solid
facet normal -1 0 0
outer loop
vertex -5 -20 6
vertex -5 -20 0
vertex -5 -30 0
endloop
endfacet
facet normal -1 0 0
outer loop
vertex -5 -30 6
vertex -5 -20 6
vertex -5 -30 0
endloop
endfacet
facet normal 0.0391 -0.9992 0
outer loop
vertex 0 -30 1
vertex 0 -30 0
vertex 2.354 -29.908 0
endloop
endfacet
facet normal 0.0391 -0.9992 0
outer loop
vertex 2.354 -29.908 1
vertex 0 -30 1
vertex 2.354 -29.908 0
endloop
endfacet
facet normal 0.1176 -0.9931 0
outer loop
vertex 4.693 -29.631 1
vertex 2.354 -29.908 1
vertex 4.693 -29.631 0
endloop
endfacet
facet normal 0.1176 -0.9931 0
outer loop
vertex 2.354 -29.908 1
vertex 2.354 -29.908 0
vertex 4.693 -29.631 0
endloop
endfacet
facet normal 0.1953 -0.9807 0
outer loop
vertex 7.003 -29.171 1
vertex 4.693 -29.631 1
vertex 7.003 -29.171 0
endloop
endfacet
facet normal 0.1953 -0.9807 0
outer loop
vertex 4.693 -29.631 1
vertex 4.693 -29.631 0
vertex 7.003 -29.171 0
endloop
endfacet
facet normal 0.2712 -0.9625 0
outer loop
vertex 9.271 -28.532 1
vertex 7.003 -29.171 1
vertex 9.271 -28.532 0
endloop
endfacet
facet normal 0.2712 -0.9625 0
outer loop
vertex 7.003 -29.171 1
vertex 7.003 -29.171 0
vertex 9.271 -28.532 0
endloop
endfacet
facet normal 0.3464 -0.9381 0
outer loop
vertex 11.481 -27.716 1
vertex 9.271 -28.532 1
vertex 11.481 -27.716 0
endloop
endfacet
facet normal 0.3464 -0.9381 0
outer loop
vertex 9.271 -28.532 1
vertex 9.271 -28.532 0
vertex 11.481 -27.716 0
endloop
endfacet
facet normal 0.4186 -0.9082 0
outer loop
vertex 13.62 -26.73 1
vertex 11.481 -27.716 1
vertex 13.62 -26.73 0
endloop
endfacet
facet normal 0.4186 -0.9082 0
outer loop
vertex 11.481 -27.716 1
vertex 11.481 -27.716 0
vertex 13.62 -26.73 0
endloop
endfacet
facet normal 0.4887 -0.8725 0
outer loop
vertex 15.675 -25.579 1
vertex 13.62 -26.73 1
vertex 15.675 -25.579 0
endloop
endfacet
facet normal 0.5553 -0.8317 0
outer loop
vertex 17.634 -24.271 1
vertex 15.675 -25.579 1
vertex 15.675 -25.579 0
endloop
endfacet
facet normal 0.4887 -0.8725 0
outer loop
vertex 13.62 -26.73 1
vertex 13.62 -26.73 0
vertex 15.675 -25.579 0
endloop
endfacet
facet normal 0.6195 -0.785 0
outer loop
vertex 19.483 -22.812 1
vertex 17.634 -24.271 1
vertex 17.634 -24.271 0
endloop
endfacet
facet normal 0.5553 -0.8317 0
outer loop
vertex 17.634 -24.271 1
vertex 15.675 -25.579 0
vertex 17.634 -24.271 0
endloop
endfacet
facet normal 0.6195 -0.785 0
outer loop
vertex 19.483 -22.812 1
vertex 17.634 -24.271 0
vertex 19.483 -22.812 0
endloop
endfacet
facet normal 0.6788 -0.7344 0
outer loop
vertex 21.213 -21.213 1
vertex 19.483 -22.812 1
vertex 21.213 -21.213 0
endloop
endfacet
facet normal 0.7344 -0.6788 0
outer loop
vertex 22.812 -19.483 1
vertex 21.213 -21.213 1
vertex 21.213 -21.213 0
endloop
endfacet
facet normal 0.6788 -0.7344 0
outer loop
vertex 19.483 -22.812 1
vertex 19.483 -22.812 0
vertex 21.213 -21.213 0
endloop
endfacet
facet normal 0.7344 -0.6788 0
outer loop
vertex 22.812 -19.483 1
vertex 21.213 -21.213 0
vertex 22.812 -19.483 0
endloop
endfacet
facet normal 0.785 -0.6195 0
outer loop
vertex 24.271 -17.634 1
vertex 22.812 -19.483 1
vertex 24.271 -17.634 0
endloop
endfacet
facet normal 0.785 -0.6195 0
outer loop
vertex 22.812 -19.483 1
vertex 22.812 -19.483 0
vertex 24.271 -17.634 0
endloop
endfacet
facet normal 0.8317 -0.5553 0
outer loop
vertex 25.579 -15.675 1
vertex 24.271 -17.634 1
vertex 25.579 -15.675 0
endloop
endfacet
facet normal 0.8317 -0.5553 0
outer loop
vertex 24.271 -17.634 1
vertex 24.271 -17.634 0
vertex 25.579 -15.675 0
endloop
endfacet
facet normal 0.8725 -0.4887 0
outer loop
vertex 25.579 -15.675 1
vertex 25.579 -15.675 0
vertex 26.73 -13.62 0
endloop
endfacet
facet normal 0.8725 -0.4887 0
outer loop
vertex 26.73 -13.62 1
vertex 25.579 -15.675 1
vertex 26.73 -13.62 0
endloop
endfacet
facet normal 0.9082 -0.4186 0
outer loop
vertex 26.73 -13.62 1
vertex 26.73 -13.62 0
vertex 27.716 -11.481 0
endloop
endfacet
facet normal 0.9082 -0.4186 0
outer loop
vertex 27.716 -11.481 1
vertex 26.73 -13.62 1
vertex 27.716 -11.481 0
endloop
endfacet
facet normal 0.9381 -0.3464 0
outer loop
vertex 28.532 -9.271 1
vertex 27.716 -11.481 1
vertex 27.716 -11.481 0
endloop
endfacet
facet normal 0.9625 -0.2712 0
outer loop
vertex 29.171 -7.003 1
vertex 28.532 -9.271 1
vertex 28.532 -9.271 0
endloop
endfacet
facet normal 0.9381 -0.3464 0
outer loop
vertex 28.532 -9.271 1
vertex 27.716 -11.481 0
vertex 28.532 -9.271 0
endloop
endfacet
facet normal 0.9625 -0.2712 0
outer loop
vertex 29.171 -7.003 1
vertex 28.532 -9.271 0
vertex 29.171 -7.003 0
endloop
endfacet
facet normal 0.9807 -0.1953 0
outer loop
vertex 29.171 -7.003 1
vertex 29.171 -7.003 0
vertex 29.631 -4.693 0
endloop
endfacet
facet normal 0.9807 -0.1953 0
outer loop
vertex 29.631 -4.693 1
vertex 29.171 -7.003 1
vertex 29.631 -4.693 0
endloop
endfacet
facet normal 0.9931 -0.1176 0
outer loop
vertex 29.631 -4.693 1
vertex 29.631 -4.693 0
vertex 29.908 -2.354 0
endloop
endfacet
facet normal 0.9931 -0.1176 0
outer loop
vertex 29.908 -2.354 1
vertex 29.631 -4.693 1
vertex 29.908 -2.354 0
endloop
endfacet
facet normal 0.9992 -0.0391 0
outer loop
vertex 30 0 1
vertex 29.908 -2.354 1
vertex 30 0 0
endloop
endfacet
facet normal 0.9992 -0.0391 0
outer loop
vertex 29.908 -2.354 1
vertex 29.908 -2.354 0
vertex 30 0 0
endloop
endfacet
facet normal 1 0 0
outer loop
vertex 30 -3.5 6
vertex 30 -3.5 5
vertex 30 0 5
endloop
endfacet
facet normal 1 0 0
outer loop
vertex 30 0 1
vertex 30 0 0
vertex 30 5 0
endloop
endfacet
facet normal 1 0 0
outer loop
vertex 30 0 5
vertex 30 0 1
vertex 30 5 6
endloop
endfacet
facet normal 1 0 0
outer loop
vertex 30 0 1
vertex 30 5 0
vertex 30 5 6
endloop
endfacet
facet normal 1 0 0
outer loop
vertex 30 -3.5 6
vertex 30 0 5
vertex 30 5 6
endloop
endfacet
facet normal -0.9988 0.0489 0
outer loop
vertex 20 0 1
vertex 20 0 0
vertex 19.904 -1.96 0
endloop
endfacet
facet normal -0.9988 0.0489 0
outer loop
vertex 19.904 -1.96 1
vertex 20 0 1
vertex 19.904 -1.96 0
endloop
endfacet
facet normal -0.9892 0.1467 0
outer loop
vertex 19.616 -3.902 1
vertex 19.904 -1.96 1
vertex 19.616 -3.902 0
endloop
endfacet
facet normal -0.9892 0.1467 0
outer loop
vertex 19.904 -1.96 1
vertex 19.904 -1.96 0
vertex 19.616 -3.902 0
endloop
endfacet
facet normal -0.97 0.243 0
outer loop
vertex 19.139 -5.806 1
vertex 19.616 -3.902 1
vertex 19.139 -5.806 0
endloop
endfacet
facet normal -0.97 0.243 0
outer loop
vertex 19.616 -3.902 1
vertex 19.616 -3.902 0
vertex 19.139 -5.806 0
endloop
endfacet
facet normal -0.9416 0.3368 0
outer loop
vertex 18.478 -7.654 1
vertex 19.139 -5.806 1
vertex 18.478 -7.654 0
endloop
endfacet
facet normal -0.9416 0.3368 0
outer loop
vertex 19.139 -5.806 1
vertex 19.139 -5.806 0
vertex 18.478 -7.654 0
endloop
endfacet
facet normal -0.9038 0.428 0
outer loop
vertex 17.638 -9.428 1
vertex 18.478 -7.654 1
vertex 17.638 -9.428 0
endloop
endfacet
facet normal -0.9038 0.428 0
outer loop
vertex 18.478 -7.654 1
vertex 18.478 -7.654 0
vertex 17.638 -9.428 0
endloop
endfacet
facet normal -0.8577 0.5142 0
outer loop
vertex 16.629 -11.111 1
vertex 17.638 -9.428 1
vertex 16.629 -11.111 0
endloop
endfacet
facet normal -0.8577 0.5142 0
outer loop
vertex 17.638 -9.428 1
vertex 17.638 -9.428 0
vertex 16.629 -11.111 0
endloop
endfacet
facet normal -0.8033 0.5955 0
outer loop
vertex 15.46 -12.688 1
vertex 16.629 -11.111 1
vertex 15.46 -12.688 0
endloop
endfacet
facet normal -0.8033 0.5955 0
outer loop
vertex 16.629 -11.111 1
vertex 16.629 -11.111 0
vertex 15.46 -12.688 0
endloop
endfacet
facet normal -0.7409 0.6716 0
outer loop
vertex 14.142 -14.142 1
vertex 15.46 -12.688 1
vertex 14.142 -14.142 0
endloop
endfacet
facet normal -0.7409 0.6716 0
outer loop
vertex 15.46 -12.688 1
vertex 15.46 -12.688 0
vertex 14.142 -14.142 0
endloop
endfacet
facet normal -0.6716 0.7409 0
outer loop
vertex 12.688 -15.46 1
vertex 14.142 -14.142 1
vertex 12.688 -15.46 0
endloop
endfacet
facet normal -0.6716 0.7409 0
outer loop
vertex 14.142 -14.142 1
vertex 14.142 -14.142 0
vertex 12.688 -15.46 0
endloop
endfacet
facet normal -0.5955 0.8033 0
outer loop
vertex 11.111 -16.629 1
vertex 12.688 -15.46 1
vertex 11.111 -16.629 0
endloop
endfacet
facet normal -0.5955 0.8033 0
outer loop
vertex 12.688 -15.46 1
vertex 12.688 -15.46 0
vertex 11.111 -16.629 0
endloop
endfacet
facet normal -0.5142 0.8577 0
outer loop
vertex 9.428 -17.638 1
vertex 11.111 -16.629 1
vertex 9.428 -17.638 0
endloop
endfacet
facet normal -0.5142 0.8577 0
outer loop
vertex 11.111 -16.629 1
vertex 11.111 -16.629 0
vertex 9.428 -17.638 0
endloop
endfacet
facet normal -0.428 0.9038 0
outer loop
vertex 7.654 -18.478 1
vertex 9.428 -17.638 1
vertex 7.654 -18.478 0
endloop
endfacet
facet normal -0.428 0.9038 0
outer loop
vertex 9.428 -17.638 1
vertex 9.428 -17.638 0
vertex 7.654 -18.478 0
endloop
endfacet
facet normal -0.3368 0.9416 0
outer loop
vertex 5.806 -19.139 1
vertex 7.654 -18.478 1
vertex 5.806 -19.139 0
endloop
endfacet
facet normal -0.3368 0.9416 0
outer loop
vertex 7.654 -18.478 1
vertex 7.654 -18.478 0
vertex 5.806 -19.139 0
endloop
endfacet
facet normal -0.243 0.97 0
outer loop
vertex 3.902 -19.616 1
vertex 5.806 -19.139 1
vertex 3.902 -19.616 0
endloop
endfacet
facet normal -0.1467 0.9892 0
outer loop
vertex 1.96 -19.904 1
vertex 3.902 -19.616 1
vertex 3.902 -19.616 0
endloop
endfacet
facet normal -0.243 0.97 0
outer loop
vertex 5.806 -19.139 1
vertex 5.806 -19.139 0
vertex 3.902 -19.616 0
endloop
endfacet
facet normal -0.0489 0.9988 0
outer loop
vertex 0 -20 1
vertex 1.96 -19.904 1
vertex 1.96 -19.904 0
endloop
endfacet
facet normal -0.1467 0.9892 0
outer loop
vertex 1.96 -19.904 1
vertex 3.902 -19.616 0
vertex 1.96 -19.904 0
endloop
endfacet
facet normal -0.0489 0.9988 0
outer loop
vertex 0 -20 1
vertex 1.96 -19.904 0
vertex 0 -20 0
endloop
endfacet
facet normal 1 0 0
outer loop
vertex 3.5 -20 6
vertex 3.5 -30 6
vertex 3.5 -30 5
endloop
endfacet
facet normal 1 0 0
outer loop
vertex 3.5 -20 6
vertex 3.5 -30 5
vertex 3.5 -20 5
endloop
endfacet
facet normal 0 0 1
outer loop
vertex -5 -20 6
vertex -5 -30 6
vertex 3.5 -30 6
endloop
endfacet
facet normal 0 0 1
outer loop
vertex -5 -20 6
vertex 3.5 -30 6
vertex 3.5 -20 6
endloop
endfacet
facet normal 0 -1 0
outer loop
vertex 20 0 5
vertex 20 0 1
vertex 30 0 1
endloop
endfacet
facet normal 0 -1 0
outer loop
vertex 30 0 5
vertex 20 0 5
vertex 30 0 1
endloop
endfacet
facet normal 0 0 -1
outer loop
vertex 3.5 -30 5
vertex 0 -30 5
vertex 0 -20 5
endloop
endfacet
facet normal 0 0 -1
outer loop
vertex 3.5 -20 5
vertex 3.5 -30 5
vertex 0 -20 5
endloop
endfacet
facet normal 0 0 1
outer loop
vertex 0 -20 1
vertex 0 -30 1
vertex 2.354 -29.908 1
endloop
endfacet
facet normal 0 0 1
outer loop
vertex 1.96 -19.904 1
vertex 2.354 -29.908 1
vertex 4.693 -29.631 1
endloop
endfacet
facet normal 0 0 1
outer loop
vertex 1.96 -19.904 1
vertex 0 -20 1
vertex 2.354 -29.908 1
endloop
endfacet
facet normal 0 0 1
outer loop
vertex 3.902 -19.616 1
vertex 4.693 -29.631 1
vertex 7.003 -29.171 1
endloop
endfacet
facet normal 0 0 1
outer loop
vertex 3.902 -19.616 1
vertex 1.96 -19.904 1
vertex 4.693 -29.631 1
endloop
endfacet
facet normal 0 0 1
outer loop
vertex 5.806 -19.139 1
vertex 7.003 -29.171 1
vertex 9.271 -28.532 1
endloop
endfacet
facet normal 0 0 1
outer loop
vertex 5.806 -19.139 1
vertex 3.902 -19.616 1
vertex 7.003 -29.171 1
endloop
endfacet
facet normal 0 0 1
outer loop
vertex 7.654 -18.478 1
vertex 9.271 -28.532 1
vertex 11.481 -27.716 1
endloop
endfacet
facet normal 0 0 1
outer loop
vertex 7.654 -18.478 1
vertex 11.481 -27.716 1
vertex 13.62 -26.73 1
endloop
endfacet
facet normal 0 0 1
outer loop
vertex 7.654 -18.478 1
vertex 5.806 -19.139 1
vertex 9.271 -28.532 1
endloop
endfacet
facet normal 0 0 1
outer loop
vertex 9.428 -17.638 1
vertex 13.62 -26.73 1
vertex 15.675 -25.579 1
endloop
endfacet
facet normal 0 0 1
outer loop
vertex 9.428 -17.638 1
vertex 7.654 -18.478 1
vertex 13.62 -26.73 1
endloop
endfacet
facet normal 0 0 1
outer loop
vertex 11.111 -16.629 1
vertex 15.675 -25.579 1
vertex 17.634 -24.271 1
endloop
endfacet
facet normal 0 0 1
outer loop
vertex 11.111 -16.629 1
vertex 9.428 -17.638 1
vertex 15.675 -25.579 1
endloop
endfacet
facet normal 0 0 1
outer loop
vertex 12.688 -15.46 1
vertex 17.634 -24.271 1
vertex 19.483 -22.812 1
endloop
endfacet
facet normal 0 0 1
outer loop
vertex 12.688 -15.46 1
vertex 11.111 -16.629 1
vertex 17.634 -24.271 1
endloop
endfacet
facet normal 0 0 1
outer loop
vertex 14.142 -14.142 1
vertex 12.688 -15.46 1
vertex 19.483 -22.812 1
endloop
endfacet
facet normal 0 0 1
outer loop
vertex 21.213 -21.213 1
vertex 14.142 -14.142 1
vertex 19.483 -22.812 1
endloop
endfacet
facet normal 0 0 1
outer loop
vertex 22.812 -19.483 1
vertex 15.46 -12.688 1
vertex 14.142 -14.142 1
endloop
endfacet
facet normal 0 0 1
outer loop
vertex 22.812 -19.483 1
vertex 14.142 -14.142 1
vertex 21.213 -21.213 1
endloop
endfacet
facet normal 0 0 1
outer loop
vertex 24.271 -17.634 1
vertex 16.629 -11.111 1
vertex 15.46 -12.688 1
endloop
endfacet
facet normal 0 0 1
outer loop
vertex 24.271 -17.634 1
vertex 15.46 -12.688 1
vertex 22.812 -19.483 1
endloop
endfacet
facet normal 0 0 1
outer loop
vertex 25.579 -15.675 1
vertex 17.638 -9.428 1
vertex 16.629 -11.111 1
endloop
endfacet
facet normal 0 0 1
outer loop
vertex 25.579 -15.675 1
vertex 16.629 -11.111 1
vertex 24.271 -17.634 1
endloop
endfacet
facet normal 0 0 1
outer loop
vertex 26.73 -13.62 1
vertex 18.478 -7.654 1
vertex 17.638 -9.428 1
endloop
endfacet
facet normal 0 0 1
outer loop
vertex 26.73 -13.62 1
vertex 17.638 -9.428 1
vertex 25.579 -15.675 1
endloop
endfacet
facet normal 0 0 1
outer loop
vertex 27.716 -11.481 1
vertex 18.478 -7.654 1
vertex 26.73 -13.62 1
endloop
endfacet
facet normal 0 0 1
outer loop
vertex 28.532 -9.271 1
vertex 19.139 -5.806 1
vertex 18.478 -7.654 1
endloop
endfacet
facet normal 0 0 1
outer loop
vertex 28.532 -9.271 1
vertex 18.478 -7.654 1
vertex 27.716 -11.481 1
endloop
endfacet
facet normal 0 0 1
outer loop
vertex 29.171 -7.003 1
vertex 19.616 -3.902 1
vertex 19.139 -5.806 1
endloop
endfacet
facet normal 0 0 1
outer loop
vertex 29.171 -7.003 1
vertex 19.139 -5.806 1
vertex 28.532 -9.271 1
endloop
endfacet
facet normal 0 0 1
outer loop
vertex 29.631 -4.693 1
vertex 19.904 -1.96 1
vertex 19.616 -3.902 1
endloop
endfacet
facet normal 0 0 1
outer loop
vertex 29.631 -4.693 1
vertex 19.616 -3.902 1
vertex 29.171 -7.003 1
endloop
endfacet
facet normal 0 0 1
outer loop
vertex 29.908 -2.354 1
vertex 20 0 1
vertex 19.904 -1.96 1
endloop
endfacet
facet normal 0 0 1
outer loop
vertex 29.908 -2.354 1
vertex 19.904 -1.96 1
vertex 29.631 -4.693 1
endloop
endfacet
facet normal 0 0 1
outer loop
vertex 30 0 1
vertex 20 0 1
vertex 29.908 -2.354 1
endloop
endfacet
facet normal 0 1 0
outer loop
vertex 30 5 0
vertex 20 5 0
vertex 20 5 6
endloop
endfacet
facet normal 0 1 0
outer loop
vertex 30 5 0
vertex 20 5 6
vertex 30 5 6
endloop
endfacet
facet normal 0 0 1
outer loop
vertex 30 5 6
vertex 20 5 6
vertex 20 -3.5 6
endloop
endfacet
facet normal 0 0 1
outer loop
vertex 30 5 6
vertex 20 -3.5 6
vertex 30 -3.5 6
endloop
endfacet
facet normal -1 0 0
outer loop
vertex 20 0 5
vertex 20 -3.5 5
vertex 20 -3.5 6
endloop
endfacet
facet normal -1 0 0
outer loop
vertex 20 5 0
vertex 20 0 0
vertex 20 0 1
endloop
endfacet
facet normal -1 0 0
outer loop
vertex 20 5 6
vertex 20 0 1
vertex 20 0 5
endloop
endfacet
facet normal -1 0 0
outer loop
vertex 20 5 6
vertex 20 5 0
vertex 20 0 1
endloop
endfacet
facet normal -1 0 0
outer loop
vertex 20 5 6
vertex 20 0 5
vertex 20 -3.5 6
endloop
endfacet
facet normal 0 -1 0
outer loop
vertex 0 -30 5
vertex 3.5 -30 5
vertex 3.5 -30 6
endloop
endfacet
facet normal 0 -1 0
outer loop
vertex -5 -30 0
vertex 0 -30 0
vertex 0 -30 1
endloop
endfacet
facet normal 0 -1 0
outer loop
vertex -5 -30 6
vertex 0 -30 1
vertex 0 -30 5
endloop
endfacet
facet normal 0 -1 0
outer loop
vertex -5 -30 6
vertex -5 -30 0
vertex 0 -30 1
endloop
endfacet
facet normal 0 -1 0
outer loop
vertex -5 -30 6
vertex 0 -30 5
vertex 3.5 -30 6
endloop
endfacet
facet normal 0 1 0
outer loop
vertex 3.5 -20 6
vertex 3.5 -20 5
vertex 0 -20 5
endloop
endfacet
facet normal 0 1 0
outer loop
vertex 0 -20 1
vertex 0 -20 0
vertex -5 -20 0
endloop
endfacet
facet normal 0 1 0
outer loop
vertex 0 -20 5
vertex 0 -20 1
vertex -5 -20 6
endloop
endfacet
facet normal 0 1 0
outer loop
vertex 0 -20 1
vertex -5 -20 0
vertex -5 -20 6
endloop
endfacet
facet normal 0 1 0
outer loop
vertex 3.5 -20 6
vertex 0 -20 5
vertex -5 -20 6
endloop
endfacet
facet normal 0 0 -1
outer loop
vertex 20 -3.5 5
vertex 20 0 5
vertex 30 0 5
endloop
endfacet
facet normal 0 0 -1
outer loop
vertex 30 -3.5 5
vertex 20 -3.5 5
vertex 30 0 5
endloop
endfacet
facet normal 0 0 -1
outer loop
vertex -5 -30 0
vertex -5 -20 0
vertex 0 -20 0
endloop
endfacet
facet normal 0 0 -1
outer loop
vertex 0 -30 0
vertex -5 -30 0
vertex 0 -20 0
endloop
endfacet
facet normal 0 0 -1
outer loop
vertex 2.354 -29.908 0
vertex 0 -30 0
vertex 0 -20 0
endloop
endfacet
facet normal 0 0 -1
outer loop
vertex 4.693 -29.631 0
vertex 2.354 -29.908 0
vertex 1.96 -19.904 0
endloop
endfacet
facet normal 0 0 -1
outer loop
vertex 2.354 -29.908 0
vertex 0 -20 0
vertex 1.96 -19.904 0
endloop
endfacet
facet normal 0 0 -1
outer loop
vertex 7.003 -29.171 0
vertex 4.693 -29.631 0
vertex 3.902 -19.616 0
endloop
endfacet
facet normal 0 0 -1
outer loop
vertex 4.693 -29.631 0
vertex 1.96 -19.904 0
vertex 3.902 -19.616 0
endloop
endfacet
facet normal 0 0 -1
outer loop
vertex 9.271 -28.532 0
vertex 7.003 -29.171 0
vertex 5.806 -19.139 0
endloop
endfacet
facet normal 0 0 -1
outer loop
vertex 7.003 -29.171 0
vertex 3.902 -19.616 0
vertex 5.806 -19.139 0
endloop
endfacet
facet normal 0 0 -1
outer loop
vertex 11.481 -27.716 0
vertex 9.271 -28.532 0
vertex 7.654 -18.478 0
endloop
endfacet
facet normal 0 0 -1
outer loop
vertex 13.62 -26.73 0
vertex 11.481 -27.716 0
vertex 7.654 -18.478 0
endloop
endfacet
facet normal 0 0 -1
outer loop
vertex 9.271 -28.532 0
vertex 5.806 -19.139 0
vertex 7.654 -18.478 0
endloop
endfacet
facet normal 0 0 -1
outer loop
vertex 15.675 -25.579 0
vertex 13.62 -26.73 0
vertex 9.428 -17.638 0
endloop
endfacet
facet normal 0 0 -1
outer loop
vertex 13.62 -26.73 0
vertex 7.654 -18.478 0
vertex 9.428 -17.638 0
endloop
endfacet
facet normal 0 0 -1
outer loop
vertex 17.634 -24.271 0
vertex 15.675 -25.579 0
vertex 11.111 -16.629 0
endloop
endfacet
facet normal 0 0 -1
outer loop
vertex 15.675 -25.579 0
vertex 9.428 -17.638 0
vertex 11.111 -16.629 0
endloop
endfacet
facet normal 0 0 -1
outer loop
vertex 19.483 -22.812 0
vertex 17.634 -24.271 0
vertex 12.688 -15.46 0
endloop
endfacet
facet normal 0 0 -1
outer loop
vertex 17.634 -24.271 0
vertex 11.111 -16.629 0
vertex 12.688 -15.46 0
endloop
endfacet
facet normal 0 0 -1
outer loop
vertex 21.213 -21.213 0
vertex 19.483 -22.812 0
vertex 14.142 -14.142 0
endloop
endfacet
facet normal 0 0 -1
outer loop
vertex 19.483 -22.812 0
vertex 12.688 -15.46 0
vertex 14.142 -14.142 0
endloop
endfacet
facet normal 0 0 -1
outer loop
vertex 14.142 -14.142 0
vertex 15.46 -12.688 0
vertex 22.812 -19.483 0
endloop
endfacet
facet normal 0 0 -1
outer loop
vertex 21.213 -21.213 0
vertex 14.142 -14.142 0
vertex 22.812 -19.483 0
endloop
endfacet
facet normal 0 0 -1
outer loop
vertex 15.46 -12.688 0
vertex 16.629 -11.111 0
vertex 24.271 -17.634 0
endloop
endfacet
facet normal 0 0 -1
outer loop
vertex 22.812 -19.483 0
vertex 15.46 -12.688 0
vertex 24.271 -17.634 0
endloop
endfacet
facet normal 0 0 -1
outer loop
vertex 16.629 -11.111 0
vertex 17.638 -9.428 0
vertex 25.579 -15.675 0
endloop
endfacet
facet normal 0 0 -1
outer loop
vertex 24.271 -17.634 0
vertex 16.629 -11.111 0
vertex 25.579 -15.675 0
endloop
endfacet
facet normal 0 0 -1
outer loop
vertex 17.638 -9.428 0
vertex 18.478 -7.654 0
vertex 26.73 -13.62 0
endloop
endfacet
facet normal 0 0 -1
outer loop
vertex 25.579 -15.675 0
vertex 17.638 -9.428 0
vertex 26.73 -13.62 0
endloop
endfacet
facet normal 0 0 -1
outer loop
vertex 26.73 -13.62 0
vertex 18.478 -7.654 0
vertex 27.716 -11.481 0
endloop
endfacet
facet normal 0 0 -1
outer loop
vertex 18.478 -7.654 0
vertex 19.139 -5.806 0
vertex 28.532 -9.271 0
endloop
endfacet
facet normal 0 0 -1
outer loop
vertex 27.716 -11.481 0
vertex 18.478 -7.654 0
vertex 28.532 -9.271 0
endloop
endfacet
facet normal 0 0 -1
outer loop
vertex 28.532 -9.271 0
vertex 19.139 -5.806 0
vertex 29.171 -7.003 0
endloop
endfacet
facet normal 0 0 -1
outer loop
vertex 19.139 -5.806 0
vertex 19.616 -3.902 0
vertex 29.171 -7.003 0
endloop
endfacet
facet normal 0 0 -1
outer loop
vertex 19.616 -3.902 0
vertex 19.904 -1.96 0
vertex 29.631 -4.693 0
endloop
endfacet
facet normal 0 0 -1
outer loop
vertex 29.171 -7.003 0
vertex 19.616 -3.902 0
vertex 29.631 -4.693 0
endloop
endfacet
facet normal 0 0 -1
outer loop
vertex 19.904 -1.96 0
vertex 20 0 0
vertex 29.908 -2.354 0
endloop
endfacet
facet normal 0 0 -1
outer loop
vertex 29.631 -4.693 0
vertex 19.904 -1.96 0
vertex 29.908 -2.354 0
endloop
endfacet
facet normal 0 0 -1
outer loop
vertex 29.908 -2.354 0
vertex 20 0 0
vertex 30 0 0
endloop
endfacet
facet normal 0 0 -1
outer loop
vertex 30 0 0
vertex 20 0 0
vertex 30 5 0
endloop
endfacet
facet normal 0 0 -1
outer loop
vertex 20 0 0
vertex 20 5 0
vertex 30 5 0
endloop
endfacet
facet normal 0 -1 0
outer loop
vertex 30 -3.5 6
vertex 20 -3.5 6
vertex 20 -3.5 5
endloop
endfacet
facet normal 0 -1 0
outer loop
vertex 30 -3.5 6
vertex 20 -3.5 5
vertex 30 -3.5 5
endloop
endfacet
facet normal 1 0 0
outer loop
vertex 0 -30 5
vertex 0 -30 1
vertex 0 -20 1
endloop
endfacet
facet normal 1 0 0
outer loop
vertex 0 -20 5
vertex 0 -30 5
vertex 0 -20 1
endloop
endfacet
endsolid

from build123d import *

# Parameters (mm, degrees)
F1_DEPTH = 1
F2_W     = 10
F2_H     = 5
F2_W_2   = 5
F2_H_2   = 10
F3_DEPTH = 5
F5_W     = 10
F5_H     = 1
F6_DEPTH = 3.5
F4_W     = 10
F4_H     = 1
F7_DEPTH = 3.5


with BuildPart() as f1:
    # F0 (on Top) → F1 (new body)
    with BuildSketch(Plane.XY):
        with BuildLine():
            Line((30, 0), (20, 0))
            ThreePointArc((20, 0), (14.1421356237, -14.1421356237), (0, -20))
            Line((0, -20), (0, -25))
            Line((0, -25), (0, -30))
            ThreePointArc((0, -30), (21.2132034356, -21.2132034356), (30, 0))
        make_face()
        with BuildLine():
            Line((20, 5), (20, 0))
            Line((20, 0), (30, 0))
            ThreePointArc((30, 0), (29.8949156836, 2.5087878084), (29.5803989155, 5))
            Line((29.5803989155, 5), (20, 5))
        make_face()
        with BuildLine():
            Line((0, -25), (0, -20))
            Line((0, -20), (-5, -20))
            Line((-5, -20), (-5, -29.5803989155))
            ThreePointArc((-5, -29.5803989155), (-2.5087878084, -29.8949156836), (0, -30))
            Line((0, -30), (0, -25))
        make_face()
        with BuildLine():
            ThreePointArc((29.5803989155, 5), (29.8949156836, 2.5087878084), (30, 0))
            Line((30, 0), (30, 5))
            Line((30, 5), (29.5803989155, 5))
        make_face()
        with BuildLine():
            Line((-5, -30), (0, -30))
            ThreePointArc((0, -30), (-2.5087878084, -29.8949156836), (-5, -29.5803989155))
            Line((-5, -29.5803989155), (-5, -30))
        make_face()
    extrude(amount=F1_DEPTH)

    # F2 (on face) → F3 (join)
    with BuildSketch(Plane.XY.offset(1)):
        with Locations((25, 2.5)):
            Rectangle(F2_W, F2_H)
        with Locations((-2.5, -25)):
            Rectangle(F2_W_2, F2_H_2)
    extrude(amount=F3_DEPTH)

    # F5 (on face) → F6 (join)
    with BuildSketch(Plane.YZ):
        with Locations((-25, 5.5)):
            Rectangle(F5_W, F5_H)
    extrude(amount=F6_DEPTH)

    # F4 (on face) → F7 (join)
    with BuildSketch(Plane.XZ):
        with Locations((25, 5.5)):
            Rectangle(F4_W, F4_H)
    extrude(amount=F7_DEPTH)


solid = f1.part
